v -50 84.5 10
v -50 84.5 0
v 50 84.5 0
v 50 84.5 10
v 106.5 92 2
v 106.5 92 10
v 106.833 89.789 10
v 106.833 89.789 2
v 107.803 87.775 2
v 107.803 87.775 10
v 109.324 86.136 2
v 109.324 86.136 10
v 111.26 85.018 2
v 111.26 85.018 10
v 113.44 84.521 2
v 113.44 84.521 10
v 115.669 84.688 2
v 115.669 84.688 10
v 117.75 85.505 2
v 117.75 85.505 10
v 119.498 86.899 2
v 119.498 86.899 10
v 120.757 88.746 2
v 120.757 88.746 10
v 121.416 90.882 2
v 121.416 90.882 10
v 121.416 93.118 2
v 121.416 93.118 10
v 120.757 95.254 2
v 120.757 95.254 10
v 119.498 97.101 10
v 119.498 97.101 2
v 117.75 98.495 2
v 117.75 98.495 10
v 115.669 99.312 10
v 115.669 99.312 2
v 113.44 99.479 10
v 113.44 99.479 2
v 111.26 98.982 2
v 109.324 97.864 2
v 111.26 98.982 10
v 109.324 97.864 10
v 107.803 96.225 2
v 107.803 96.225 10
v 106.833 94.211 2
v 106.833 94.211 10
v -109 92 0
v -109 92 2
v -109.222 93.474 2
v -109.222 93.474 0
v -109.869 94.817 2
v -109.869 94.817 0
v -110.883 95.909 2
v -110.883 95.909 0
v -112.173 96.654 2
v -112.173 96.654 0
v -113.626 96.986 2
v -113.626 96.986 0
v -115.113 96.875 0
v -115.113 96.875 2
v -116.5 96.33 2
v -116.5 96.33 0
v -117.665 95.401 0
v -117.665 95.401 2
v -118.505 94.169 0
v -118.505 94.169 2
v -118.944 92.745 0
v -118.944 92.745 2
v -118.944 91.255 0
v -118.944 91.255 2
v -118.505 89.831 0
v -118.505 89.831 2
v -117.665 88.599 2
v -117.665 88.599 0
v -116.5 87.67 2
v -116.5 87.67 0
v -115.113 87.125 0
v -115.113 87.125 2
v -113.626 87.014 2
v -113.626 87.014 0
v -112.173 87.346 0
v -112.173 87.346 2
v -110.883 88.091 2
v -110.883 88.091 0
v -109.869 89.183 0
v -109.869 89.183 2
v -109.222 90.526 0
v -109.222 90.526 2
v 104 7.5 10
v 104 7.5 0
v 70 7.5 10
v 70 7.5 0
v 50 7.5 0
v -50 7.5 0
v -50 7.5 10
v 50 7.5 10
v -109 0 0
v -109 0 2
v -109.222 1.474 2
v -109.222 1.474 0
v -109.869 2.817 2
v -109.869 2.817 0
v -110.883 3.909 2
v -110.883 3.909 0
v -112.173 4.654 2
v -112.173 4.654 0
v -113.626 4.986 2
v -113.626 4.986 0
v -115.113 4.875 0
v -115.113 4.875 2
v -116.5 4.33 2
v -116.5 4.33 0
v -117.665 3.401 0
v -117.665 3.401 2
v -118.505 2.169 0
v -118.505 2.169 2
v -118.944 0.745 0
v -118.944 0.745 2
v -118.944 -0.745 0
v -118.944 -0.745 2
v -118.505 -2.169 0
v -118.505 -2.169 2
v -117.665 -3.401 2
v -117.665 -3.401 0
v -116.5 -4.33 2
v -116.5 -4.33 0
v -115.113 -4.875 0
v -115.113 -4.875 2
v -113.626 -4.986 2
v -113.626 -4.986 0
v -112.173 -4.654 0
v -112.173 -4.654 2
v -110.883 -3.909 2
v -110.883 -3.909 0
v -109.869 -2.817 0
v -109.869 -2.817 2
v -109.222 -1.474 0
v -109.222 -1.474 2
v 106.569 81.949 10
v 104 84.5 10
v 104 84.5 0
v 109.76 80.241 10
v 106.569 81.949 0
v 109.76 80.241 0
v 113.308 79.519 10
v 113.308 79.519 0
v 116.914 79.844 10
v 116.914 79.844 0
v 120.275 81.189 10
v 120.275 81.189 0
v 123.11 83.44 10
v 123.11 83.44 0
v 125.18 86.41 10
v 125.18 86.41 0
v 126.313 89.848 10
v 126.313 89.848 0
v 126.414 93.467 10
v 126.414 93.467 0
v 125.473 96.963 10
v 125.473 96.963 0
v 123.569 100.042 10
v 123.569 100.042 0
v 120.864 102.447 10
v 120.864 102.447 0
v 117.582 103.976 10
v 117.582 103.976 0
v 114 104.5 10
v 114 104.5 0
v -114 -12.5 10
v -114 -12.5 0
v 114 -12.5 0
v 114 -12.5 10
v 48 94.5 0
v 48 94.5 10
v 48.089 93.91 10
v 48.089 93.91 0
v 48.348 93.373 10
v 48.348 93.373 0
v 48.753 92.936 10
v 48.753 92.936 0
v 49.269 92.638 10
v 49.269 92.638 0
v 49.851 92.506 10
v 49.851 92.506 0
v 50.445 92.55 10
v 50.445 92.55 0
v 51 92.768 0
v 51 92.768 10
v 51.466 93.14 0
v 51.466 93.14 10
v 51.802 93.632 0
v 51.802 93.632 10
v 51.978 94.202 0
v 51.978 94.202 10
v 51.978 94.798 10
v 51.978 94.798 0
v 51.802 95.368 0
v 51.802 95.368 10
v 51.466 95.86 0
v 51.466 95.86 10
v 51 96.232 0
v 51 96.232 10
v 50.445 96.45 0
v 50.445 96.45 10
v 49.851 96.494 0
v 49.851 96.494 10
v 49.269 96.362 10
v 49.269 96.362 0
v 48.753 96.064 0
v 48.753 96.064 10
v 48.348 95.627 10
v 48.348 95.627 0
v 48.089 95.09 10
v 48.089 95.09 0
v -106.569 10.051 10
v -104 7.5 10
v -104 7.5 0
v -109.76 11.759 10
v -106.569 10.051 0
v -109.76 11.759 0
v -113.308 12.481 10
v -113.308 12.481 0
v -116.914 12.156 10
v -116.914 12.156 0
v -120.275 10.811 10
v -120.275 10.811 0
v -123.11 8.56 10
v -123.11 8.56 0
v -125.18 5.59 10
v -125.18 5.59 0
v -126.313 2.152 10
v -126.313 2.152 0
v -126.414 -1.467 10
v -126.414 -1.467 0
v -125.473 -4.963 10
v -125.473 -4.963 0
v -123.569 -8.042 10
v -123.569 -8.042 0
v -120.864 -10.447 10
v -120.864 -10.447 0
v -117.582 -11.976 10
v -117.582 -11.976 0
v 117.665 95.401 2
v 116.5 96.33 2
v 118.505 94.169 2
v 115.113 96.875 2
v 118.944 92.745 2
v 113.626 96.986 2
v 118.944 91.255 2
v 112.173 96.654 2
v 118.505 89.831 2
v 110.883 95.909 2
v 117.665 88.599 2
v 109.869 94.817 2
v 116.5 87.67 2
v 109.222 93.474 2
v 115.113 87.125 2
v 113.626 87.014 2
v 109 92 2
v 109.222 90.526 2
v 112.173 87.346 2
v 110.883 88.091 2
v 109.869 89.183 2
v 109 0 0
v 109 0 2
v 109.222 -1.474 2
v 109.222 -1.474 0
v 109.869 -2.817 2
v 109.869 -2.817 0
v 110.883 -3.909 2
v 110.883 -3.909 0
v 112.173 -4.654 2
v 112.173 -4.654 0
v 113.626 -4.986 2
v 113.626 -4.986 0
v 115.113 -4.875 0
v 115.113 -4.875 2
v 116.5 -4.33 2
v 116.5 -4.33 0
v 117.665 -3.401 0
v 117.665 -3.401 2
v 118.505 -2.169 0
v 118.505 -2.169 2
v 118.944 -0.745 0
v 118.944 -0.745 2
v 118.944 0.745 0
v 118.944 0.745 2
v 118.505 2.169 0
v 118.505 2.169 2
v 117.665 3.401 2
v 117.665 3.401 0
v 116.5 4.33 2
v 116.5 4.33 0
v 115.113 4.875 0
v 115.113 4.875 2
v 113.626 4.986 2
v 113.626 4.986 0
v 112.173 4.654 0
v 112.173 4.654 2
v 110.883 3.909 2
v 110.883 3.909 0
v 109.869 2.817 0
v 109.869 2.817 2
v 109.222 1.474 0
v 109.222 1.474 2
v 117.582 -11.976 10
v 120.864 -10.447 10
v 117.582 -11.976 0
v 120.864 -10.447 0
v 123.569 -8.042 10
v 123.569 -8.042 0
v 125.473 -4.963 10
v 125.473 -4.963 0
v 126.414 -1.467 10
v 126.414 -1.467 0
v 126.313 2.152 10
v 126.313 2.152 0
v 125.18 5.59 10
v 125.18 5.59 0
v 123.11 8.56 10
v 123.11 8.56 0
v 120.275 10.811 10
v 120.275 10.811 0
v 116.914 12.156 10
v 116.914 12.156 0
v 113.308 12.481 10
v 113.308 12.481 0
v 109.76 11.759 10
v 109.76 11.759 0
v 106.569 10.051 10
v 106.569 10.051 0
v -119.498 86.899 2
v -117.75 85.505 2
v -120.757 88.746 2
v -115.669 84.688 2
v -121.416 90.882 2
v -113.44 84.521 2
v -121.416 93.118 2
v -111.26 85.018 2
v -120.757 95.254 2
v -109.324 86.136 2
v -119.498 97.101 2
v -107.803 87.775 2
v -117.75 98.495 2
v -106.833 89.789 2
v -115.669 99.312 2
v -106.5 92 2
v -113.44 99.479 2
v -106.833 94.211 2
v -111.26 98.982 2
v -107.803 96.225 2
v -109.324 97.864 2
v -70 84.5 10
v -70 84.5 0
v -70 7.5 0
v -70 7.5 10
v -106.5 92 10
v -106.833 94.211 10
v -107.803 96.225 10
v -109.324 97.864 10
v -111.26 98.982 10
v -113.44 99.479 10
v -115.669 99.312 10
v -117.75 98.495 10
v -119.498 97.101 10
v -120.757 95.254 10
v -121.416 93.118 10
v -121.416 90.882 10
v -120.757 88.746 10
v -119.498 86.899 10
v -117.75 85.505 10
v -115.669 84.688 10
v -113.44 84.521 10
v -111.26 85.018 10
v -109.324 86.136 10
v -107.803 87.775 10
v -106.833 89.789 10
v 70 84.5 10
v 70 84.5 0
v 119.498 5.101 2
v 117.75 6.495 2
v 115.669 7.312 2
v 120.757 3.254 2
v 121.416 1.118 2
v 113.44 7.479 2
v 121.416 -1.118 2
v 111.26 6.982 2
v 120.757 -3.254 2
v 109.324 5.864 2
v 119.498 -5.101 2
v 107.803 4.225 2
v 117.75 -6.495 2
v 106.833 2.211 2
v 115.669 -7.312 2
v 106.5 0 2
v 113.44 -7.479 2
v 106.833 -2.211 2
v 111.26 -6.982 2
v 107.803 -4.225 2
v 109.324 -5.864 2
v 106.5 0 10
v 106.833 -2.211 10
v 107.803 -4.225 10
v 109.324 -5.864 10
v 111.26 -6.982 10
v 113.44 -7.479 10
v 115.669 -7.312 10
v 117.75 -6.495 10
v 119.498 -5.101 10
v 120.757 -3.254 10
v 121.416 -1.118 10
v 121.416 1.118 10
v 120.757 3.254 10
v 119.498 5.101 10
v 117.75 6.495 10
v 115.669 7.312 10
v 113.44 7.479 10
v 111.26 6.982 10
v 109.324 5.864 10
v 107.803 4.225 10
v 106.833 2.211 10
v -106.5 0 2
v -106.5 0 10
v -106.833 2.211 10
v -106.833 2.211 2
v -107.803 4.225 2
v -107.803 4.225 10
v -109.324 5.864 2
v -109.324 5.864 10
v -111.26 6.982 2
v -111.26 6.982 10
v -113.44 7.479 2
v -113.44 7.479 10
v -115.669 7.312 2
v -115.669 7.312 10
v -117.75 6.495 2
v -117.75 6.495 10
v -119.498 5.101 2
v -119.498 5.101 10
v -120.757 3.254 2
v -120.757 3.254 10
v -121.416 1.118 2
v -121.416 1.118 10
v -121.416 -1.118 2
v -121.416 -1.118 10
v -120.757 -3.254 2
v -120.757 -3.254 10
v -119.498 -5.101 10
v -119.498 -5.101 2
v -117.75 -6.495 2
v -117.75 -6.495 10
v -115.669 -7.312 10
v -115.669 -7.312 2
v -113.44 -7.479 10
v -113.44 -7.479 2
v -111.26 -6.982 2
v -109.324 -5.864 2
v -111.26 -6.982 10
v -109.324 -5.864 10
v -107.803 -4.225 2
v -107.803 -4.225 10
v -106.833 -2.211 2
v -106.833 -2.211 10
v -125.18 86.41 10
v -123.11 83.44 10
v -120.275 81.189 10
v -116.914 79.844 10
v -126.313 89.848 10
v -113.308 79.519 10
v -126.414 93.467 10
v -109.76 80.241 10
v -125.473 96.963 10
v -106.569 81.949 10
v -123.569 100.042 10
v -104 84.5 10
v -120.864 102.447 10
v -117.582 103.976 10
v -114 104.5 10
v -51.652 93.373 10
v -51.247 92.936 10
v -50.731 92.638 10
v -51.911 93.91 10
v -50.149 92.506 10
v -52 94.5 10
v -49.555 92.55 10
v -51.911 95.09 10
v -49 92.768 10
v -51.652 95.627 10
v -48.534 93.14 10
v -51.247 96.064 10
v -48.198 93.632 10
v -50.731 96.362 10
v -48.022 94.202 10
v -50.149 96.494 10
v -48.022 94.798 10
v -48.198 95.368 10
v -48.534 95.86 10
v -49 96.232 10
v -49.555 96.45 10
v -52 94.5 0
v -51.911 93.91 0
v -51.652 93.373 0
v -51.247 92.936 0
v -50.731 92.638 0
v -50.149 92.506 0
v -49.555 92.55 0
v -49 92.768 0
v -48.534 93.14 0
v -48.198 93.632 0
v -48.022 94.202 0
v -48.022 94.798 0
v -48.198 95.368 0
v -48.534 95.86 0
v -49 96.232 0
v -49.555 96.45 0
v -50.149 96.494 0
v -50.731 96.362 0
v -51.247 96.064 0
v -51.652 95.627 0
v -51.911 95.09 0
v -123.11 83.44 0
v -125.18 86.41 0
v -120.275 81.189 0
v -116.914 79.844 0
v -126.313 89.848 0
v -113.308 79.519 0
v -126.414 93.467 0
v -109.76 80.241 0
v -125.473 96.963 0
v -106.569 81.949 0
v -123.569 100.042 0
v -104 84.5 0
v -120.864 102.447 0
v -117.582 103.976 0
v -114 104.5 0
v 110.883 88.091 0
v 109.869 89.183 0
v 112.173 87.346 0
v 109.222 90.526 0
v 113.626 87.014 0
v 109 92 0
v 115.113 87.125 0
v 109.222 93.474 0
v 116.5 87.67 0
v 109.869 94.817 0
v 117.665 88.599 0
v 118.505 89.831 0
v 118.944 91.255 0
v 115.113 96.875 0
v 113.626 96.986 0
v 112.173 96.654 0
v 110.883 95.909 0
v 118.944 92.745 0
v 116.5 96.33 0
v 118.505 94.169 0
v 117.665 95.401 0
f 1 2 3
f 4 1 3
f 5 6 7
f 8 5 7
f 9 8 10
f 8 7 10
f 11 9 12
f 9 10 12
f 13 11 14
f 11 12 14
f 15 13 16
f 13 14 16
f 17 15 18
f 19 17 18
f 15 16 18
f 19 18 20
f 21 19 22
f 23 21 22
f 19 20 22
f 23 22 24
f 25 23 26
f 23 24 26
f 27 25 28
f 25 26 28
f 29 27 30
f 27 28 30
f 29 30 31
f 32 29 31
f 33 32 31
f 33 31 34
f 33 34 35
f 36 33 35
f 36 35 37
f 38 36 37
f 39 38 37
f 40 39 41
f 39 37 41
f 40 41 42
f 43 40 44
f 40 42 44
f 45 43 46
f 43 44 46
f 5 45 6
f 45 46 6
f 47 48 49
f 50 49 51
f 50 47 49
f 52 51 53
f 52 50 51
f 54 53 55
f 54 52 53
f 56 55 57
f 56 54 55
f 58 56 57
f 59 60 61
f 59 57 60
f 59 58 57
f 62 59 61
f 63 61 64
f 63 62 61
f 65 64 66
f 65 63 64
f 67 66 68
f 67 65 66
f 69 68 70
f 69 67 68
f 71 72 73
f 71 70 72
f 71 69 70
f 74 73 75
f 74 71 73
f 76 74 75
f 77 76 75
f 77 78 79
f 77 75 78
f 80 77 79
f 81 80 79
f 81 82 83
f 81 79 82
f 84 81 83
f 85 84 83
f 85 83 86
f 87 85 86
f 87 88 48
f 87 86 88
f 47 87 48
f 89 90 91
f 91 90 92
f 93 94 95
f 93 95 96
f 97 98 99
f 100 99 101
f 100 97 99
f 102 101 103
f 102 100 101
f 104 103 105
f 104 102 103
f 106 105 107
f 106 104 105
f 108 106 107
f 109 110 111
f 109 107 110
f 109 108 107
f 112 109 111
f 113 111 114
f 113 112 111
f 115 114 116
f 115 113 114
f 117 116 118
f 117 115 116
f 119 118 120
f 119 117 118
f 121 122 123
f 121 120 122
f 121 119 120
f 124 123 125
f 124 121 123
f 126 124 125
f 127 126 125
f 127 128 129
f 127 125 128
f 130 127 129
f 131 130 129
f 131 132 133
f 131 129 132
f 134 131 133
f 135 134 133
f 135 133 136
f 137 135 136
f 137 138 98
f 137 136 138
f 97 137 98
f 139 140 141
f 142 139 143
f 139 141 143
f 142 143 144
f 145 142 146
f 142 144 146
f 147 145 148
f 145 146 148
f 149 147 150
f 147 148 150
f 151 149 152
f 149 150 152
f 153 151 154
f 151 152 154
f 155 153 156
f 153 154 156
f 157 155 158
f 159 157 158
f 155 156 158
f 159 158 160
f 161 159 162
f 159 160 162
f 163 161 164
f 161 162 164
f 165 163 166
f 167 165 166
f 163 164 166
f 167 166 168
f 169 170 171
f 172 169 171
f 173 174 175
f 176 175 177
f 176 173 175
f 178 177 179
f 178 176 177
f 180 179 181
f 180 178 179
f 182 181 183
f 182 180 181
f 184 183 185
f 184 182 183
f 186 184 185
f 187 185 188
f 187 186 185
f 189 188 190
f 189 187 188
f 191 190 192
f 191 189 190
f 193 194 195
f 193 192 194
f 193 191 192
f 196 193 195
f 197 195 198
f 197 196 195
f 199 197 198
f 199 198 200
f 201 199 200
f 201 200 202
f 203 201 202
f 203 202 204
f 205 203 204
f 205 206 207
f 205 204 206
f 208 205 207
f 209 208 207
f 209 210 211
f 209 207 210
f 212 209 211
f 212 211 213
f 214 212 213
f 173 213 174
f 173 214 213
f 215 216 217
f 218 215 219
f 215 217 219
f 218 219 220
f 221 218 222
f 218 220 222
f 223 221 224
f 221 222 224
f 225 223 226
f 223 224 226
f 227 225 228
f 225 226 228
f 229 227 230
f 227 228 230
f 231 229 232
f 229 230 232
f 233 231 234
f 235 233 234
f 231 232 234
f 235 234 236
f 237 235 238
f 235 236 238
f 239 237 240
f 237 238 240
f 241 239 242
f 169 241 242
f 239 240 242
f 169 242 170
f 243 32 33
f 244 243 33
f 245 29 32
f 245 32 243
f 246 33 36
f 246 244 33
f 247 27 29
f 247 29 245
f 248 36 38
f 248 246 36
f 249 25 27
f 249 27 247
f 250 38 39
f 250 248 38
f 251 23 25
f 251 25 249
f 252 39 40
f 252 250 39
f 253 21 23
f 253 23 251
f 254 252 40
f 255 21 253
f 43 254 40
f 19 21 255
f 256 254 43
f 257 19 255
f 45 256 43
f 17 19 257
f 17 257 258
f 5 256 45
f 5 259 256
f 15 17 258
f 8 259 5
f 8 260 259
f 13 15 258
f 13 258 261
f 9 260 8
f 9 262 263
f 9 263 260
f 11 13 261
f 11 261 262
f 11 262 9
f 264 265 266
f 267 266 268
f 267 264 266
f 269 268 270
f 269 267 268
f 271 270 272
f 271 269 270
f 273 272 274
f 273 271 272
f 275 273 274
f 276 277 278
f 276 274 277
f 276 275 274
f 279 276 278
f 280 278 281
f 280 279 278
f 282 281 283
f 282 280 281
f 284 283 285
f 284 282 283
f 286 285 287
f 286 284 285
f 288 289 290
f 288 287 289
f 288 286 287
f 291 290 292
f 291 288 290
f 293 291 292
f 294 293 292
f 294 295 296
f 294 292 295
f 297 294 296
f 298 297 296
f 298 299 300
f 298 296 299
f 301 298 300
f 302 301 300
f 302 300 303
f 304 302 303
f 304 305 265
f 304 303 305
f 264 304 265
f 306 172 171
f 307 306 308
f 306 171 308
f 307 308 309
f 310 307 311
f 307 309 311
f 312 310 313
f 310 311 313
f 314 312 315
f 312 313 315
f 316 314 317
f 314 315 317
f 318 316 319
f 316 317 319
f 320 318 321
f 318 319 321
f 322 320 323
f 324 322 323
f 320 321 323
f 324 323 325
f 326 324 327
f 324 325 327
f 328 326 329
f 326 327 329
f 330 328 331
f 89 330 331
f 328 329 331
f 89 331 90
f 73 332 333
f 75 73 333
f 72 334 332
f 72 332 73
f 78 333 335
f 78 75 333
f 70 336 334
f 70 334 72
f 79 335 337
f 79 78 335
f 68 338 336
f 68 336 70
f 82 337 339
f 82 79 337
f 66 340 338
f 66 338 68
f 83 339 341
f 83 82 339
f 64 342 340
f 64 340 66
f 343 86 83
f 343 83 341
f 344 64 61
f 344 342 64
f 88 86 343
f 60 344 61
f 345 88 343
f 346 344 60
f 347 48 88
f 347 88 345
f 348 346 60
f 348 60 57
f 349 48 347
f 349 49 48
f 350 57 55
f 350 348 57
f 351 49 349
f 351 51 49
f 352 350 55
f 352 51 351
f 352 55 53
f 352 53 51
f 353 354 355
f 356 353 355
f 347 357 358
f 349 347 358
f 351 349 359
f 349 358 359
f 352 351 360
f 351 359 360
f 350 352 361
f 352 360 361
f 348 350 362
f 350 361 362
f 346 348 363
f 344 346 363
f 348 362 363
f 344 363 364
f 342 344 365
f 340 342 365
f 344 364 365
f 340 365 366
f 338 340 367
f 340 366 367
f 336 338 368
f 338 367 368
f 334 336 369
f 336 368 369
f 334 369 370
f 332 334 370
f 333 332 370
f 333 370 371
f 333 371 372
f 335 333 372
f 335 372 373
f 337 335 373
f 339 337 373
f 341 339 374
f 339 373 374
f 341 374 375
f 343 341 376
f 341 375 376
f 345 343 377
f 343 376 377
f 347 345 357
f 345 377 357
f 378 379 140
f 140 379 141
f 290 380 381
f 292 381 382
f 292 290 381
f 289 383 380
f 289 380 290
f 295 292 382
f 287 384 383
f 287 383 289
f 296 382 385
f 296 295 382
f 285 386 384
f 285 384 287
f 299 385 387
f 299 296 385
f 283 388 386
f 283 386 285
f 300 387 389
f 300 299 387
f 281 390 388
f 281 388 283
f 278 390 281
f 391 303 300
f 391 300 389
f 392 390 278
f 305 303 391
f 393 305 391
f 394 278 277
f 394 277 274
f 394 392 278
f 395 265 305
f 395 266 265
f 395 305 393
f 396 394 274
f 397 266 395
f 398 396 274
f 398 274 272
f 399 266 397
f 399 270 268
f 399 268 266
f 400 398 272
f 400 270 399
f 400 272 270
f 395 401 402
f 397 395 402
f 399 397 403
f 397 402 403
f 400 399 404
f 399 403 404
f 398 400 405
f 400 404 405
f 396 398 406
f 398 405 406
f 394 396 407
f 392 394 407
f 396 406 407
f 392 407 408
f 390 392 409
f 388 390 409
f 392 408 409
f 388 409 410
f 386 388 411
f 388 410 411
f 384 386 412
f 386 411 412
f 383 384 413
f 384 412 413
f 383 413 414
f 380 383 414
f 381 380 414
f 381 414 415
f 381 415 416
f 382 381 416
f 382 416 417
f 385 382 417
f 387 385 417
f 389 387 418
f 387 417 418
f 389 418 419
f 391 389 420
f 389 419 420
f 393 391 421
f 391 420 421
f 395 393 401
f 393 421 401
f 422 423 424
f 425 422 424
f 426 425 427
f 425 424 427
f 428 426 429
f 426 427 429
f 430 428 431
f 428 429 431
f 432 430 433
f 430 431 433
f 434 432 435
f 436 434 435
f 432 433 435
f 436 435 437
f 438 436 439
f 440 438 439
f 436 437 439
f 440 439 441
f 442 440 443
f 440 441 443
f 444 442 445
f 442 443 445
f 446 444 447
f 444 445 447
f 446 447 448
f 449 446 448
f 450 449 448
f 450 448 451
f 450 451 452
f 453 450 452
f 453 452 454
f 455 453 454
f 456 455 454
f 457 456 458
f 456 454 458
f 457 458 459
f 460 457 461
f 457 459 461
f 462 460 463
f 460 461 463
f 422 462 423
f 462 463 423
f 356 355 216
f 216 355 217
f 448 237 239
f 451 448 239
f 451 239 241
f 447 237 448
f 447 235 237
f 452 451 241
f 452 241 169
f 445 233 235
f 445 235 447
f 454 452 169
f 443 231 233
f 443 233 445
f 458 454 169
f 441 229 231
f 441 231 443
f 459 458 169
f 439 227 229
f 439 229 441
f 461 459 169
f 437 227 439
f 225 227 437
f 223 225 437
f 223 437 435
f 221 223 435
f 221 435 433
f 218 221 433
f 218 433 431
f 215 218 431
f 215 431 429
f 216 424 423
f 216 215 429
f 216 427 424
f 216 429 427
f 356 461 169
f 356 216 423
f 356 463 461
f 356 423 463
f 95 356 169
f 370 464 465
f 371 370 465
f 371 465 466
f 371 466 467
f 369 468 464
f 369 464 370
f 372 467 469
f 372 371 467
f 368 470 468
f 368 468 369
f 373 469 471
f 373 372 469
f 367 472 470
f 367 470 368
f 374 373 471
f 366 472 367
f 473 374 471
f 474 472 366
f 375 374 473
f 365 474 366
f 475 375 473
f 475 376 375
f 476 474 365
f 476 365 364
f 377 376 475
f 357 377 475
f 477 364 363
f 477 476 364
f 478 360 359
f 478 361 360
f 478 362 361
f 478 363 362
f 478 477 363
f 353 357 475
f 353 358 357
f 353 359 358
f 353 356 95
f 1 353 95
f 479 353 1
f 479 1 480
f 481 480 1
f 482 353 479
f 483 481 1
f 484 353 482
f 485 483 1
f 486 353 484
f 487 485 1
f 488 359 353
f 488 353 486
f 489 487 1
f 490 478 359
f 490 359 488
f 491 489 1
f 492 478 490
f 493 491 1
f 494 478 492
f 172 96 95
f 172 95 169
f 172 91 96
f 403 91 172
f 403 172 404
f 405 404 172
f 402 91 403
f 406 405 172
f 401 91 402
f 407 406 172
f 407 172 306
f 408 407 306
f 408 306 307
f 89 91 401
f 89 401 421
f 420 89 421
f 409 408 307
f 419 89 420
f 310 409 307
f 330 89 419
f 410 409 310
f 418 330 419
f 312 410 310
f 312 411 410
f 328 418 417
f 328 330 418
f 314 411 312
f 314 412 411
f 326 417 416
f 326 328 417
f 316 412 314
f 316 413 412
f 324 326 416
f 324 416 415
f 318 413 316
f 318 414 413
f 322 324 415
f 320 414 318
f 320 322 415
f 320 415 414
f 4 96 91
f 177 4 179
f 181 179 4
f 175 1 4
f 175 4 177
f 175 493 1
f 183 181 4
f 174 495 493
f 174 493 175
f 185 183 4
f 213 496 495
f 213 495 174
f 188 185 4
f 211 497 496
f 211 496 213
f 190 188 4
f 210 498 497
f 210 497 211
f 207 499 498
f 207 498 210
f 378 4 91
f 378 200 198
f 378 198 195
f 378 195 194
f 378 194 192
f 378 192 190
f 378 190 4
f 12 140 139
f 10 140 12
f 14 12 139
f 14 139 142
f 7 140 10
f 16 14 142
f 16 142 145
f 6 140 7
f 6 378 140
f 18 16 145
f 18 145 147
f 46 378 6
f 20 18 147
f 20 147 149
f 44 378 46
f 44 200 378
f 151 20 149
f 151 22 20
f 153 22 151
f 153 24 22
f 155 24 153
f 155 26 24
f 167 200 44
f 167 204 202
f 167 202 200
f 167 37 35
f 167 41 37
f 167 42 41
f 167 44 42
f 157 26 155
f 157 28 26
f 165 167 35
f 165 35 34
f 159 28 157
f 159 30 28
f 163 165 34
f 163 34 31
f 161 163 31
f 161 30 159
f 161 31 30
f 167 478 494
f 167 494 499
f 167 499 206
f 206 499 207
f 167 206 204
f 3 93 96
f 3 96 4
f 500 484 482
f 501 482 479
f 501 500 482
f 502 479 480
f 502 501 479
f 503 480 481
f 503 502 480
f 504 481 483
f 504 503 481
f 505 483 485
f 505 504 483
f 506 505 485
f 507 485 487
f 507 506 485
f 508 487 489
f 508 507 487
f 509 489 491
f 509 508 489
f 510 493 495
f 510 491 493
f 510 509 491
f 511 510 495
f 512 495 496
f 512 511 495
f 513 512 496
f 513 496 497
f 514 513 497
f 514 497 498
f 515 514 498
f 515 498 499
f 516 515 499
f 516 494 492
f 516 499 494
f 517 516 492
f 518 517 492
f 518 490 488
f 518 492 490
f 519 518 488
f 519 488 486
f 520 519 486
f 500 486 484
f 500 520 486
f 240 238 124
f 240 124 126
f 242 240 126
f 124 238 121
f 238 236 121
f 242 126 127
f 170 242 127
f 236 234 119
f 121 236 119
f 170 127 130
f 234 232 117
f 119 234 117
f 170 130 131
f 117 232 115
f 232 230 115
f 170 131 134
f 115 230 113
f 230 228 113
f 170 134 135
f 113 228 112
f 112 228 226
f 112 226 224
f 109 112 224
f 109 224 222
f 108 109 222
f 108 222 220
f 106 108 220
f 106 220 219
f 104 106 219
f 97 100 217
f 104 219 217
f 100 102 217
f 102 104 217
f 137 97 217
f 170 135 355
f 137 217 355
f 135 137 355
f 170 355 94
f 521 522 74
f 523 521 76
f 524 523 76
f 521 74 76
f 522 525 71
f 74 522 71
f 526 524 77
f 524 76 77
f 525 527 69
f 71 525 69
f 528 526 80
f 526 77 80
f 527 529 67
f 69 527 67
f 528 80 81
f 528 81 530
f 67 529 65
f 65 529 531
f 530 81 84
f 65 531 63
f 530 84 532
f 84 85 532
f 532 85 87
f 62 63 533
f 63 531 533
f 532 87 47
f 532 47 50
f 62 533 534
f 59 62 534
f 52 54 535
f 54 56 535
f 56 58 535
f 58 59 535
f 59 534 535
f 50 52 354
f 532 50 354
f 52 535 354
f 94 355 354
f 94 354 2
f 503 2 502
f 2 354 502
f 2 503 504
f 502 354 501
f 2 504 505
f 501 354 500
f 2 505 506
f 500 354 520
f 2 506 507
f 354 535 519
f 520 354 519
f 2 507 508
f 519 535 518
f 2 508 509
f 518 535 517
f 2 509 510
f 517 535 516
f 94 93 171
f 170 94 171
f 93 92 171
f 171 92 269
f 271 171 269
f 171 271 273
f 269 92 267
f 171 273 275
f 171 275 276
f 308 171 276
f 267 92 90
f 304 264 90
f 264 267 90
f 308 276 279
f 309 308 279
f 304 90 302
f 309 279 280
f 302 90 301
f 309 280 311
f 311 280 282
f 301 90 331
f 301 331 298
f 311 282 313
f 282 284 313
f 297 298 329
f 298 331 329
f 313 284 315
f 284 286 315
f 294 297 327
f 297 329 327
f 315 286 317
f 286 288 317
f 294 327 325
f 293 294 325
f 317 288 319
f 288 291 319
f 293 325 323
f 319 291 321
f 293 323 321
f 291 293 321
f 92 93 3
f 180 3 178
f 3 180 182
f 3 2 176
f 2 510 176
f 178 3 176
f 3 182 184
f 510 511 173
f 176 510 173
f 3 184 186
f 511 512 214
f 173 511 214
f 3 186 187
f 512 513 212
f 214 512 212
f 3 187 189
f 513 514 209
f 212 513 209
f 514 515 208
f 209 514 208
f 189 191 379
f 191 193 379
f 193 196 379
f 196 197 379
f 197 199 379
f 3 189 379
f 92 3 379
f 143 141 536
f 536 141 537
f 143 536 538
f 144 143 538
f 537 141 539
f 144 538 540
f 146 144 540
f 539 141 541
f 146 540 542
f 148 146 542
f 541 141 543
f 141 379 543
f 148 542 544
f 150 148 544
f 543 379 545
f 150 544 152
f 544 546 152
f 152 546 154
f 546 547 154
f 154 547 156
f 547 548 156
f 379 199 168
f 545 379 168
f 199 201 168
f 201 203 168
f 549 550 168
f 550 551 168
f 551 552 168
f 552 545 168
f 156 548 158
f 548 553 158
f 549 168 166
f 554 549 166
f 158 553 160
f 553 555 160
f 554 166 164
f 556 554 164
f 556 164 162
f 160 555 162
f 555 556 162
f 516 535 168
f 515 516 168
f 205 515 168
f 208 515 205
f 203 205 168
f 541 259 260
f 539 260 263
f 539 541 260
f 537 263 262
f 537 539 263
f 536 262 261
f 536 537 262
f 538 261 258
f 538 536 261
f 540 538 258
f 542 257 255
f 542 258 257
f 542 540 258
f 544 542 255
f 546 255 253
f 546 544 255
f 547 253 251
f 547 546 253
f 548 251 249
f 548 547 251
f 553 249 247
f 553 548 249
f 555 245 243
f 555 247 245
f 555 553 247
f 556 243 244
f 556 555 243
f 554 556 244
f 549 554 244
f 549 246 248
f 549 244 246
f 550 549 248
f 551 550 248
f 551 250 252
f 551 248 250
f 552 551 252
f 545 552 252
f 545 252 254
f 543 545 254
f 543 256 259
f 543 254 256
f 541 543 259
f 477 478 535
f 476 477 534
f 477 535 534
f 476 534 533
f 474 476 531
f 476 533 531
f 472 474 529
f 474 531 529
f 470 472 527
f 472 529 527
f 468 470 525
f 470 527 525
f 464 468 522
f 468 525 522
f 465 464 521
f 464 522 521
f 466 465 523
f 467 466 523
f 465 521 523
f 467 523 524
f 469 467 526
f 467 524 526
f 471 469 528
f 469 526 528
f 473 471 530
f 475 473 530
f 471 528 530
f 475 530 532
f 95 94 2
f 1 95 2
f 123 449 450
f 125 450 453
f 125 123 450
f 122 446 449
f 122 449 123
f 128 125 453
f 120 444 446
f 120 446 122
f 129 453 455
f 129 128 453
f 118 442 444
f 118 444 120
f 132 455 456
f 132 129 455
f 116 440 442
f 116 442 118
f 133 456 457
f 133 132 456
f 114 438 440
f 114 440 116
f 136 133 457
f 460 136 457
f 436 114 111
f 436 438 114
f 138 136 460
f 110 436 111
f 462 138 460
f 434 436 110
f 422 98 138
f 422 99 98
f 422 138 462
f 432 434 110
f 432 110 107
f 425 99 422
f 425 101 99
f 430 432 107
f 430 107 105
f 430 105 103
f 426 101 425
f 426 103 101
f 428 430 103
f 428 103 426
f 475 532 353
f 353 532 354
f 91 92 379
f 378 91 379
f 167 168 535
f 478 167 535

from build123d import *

# Parameters (mm, degrees)
SKETCH_1_R          = 5
SKETCH_1_W          = 100
SKETCH_1_H          = 77
EXTRUDE_1_DEPTH     = 10
SKETCH_3_R          = 7.5
CUT_EXTRUDE_1_DEPTH = 8
CUT_EXTRUDE_2_REACH = 166.385
SKETCH_5_R          = 2


with BuildPart() as part:
    # 草图1 → 凸台-拉伸1 (new body)
    with BuildSketch(Plane.XY):
        with BuildLine():
            Line((-104, 84.5), (-70, 84.5))
            Line((-70, 84.5), (-70, 7.5))
            Line((-70, 7.5), (-104, 7.5))
            ThreePointArc((-104, 7.5), (-125.180339887, 5.590169944), (-114, -12.5))
            Line((-114, -12.5), (114, -12.5))
            ThreePointArc((114, -12.5), (125.180339887, 5.590169944), (104, 7.5))
            Line((104, 7.5), (70, 7.5))
            Line((70, 7.5), (70, 84.5))
            Line((70, 84.5), (104, 84.5))
            ThreePointArc((104, 84.5), (125.180339887, 86.409830056), (114, 104.5))
            Line((114, 104.5), (64, 104.5))
            Line((64, 104.5), (-64, 104.5))
            Line((-64, 104.5), (-114, 104.5))
            ThreePointArc((-114, 104.5), (-125.180339887, 86.409830056), (-104, 84.5))
        make_face()
        with Locations((-114, 0)):
            Circle(SKETCH_1_R, mode=Mode.SUBTRACT)
        with Locations((-114, 92)):
            Circle(SKETCH_1_R, mode=Mode.SUBTRACT)
        with Locations(Location((114, 92, 0), (0, 0, 180))):
            Circle(SKETCH_1_R, mode=Mode.SUBTRACT)
        with Locations(Location((114, 0, 0), (0, 0, 180))):
            Circle(SKETCH_1_R, mode=Mode.SUBTRACT)
        with Locations((0, 46)):
            Rectangle(SKETCH_1_W, SKETCH_1_H, mode=Mode.SUBTRACT)
    extrude(amount=EXTRUDE_1_DEPTH)

    # 草图3 → 切除-拉伸1 (cut)
    with BuildSketch(Plane.XY.offset(10)):
        with Locations((-114, 92)):
            Circle(SKETCH_3_R)
        with Locations((-114, 0)):
            Circle(SKETCH_3_R)
        with Locations(Location((114, 0, 0), (0, 0, 180))):
            Circle(SKETCH_3_R)
        with Locations(Location((114, 92, 0), (0, 0, 180))):
            Circle(SKETCH_3_R)
    extrude(amount=-CUT_EXTRUDE_1_DEPTH, mode=Mode.SUBTRACT)

    # 草图5 → 切除-拉伸2 (cut, up to next)
    with BuildSketch(Plane.XY, mode=Mode.PRIVATE) as cut_extrude_2_sk1:
        with Locations(Location((-50, 94.5, 0), (0, 0, 180))):
            Circle(SKETCH_5_R)
    cut_extrude_2_tool1 = extrude(cut_extrude_2_sk1.sketch, amount=CUT_EXTRUDE_2_REACH, mode=Mode.PRIVATE) & part.part
    # 草图5 → 切除-拉伸2 (cut, up to next)
    with BuildSketch(Plane.XY, mode=Mode.PRIVATE) as cut_extrude_2_sk2:
        with Locations(Location((50, 94.5, 0), (0, 0, 180))):
            Circle(SKETCH_5_R)
    cut_extrude_2_tool2 = extrude(cut_extrude_2_sk2.sketch, amount=CUT_EXTRUDE_2_REACH, mode=Mode.PRIVATE) & part.part
    add(cut_extrude_2_tool1.solids().sort_by_distance((-50, 94.5, 0))[0], mode=Mode.SUBTRACT)
    add(cut_extrude_2_tool2.solids().sort_by_distance((50, 94.5, 0))[0], mode=Mode.SUBTRACT)


solid = part.part
